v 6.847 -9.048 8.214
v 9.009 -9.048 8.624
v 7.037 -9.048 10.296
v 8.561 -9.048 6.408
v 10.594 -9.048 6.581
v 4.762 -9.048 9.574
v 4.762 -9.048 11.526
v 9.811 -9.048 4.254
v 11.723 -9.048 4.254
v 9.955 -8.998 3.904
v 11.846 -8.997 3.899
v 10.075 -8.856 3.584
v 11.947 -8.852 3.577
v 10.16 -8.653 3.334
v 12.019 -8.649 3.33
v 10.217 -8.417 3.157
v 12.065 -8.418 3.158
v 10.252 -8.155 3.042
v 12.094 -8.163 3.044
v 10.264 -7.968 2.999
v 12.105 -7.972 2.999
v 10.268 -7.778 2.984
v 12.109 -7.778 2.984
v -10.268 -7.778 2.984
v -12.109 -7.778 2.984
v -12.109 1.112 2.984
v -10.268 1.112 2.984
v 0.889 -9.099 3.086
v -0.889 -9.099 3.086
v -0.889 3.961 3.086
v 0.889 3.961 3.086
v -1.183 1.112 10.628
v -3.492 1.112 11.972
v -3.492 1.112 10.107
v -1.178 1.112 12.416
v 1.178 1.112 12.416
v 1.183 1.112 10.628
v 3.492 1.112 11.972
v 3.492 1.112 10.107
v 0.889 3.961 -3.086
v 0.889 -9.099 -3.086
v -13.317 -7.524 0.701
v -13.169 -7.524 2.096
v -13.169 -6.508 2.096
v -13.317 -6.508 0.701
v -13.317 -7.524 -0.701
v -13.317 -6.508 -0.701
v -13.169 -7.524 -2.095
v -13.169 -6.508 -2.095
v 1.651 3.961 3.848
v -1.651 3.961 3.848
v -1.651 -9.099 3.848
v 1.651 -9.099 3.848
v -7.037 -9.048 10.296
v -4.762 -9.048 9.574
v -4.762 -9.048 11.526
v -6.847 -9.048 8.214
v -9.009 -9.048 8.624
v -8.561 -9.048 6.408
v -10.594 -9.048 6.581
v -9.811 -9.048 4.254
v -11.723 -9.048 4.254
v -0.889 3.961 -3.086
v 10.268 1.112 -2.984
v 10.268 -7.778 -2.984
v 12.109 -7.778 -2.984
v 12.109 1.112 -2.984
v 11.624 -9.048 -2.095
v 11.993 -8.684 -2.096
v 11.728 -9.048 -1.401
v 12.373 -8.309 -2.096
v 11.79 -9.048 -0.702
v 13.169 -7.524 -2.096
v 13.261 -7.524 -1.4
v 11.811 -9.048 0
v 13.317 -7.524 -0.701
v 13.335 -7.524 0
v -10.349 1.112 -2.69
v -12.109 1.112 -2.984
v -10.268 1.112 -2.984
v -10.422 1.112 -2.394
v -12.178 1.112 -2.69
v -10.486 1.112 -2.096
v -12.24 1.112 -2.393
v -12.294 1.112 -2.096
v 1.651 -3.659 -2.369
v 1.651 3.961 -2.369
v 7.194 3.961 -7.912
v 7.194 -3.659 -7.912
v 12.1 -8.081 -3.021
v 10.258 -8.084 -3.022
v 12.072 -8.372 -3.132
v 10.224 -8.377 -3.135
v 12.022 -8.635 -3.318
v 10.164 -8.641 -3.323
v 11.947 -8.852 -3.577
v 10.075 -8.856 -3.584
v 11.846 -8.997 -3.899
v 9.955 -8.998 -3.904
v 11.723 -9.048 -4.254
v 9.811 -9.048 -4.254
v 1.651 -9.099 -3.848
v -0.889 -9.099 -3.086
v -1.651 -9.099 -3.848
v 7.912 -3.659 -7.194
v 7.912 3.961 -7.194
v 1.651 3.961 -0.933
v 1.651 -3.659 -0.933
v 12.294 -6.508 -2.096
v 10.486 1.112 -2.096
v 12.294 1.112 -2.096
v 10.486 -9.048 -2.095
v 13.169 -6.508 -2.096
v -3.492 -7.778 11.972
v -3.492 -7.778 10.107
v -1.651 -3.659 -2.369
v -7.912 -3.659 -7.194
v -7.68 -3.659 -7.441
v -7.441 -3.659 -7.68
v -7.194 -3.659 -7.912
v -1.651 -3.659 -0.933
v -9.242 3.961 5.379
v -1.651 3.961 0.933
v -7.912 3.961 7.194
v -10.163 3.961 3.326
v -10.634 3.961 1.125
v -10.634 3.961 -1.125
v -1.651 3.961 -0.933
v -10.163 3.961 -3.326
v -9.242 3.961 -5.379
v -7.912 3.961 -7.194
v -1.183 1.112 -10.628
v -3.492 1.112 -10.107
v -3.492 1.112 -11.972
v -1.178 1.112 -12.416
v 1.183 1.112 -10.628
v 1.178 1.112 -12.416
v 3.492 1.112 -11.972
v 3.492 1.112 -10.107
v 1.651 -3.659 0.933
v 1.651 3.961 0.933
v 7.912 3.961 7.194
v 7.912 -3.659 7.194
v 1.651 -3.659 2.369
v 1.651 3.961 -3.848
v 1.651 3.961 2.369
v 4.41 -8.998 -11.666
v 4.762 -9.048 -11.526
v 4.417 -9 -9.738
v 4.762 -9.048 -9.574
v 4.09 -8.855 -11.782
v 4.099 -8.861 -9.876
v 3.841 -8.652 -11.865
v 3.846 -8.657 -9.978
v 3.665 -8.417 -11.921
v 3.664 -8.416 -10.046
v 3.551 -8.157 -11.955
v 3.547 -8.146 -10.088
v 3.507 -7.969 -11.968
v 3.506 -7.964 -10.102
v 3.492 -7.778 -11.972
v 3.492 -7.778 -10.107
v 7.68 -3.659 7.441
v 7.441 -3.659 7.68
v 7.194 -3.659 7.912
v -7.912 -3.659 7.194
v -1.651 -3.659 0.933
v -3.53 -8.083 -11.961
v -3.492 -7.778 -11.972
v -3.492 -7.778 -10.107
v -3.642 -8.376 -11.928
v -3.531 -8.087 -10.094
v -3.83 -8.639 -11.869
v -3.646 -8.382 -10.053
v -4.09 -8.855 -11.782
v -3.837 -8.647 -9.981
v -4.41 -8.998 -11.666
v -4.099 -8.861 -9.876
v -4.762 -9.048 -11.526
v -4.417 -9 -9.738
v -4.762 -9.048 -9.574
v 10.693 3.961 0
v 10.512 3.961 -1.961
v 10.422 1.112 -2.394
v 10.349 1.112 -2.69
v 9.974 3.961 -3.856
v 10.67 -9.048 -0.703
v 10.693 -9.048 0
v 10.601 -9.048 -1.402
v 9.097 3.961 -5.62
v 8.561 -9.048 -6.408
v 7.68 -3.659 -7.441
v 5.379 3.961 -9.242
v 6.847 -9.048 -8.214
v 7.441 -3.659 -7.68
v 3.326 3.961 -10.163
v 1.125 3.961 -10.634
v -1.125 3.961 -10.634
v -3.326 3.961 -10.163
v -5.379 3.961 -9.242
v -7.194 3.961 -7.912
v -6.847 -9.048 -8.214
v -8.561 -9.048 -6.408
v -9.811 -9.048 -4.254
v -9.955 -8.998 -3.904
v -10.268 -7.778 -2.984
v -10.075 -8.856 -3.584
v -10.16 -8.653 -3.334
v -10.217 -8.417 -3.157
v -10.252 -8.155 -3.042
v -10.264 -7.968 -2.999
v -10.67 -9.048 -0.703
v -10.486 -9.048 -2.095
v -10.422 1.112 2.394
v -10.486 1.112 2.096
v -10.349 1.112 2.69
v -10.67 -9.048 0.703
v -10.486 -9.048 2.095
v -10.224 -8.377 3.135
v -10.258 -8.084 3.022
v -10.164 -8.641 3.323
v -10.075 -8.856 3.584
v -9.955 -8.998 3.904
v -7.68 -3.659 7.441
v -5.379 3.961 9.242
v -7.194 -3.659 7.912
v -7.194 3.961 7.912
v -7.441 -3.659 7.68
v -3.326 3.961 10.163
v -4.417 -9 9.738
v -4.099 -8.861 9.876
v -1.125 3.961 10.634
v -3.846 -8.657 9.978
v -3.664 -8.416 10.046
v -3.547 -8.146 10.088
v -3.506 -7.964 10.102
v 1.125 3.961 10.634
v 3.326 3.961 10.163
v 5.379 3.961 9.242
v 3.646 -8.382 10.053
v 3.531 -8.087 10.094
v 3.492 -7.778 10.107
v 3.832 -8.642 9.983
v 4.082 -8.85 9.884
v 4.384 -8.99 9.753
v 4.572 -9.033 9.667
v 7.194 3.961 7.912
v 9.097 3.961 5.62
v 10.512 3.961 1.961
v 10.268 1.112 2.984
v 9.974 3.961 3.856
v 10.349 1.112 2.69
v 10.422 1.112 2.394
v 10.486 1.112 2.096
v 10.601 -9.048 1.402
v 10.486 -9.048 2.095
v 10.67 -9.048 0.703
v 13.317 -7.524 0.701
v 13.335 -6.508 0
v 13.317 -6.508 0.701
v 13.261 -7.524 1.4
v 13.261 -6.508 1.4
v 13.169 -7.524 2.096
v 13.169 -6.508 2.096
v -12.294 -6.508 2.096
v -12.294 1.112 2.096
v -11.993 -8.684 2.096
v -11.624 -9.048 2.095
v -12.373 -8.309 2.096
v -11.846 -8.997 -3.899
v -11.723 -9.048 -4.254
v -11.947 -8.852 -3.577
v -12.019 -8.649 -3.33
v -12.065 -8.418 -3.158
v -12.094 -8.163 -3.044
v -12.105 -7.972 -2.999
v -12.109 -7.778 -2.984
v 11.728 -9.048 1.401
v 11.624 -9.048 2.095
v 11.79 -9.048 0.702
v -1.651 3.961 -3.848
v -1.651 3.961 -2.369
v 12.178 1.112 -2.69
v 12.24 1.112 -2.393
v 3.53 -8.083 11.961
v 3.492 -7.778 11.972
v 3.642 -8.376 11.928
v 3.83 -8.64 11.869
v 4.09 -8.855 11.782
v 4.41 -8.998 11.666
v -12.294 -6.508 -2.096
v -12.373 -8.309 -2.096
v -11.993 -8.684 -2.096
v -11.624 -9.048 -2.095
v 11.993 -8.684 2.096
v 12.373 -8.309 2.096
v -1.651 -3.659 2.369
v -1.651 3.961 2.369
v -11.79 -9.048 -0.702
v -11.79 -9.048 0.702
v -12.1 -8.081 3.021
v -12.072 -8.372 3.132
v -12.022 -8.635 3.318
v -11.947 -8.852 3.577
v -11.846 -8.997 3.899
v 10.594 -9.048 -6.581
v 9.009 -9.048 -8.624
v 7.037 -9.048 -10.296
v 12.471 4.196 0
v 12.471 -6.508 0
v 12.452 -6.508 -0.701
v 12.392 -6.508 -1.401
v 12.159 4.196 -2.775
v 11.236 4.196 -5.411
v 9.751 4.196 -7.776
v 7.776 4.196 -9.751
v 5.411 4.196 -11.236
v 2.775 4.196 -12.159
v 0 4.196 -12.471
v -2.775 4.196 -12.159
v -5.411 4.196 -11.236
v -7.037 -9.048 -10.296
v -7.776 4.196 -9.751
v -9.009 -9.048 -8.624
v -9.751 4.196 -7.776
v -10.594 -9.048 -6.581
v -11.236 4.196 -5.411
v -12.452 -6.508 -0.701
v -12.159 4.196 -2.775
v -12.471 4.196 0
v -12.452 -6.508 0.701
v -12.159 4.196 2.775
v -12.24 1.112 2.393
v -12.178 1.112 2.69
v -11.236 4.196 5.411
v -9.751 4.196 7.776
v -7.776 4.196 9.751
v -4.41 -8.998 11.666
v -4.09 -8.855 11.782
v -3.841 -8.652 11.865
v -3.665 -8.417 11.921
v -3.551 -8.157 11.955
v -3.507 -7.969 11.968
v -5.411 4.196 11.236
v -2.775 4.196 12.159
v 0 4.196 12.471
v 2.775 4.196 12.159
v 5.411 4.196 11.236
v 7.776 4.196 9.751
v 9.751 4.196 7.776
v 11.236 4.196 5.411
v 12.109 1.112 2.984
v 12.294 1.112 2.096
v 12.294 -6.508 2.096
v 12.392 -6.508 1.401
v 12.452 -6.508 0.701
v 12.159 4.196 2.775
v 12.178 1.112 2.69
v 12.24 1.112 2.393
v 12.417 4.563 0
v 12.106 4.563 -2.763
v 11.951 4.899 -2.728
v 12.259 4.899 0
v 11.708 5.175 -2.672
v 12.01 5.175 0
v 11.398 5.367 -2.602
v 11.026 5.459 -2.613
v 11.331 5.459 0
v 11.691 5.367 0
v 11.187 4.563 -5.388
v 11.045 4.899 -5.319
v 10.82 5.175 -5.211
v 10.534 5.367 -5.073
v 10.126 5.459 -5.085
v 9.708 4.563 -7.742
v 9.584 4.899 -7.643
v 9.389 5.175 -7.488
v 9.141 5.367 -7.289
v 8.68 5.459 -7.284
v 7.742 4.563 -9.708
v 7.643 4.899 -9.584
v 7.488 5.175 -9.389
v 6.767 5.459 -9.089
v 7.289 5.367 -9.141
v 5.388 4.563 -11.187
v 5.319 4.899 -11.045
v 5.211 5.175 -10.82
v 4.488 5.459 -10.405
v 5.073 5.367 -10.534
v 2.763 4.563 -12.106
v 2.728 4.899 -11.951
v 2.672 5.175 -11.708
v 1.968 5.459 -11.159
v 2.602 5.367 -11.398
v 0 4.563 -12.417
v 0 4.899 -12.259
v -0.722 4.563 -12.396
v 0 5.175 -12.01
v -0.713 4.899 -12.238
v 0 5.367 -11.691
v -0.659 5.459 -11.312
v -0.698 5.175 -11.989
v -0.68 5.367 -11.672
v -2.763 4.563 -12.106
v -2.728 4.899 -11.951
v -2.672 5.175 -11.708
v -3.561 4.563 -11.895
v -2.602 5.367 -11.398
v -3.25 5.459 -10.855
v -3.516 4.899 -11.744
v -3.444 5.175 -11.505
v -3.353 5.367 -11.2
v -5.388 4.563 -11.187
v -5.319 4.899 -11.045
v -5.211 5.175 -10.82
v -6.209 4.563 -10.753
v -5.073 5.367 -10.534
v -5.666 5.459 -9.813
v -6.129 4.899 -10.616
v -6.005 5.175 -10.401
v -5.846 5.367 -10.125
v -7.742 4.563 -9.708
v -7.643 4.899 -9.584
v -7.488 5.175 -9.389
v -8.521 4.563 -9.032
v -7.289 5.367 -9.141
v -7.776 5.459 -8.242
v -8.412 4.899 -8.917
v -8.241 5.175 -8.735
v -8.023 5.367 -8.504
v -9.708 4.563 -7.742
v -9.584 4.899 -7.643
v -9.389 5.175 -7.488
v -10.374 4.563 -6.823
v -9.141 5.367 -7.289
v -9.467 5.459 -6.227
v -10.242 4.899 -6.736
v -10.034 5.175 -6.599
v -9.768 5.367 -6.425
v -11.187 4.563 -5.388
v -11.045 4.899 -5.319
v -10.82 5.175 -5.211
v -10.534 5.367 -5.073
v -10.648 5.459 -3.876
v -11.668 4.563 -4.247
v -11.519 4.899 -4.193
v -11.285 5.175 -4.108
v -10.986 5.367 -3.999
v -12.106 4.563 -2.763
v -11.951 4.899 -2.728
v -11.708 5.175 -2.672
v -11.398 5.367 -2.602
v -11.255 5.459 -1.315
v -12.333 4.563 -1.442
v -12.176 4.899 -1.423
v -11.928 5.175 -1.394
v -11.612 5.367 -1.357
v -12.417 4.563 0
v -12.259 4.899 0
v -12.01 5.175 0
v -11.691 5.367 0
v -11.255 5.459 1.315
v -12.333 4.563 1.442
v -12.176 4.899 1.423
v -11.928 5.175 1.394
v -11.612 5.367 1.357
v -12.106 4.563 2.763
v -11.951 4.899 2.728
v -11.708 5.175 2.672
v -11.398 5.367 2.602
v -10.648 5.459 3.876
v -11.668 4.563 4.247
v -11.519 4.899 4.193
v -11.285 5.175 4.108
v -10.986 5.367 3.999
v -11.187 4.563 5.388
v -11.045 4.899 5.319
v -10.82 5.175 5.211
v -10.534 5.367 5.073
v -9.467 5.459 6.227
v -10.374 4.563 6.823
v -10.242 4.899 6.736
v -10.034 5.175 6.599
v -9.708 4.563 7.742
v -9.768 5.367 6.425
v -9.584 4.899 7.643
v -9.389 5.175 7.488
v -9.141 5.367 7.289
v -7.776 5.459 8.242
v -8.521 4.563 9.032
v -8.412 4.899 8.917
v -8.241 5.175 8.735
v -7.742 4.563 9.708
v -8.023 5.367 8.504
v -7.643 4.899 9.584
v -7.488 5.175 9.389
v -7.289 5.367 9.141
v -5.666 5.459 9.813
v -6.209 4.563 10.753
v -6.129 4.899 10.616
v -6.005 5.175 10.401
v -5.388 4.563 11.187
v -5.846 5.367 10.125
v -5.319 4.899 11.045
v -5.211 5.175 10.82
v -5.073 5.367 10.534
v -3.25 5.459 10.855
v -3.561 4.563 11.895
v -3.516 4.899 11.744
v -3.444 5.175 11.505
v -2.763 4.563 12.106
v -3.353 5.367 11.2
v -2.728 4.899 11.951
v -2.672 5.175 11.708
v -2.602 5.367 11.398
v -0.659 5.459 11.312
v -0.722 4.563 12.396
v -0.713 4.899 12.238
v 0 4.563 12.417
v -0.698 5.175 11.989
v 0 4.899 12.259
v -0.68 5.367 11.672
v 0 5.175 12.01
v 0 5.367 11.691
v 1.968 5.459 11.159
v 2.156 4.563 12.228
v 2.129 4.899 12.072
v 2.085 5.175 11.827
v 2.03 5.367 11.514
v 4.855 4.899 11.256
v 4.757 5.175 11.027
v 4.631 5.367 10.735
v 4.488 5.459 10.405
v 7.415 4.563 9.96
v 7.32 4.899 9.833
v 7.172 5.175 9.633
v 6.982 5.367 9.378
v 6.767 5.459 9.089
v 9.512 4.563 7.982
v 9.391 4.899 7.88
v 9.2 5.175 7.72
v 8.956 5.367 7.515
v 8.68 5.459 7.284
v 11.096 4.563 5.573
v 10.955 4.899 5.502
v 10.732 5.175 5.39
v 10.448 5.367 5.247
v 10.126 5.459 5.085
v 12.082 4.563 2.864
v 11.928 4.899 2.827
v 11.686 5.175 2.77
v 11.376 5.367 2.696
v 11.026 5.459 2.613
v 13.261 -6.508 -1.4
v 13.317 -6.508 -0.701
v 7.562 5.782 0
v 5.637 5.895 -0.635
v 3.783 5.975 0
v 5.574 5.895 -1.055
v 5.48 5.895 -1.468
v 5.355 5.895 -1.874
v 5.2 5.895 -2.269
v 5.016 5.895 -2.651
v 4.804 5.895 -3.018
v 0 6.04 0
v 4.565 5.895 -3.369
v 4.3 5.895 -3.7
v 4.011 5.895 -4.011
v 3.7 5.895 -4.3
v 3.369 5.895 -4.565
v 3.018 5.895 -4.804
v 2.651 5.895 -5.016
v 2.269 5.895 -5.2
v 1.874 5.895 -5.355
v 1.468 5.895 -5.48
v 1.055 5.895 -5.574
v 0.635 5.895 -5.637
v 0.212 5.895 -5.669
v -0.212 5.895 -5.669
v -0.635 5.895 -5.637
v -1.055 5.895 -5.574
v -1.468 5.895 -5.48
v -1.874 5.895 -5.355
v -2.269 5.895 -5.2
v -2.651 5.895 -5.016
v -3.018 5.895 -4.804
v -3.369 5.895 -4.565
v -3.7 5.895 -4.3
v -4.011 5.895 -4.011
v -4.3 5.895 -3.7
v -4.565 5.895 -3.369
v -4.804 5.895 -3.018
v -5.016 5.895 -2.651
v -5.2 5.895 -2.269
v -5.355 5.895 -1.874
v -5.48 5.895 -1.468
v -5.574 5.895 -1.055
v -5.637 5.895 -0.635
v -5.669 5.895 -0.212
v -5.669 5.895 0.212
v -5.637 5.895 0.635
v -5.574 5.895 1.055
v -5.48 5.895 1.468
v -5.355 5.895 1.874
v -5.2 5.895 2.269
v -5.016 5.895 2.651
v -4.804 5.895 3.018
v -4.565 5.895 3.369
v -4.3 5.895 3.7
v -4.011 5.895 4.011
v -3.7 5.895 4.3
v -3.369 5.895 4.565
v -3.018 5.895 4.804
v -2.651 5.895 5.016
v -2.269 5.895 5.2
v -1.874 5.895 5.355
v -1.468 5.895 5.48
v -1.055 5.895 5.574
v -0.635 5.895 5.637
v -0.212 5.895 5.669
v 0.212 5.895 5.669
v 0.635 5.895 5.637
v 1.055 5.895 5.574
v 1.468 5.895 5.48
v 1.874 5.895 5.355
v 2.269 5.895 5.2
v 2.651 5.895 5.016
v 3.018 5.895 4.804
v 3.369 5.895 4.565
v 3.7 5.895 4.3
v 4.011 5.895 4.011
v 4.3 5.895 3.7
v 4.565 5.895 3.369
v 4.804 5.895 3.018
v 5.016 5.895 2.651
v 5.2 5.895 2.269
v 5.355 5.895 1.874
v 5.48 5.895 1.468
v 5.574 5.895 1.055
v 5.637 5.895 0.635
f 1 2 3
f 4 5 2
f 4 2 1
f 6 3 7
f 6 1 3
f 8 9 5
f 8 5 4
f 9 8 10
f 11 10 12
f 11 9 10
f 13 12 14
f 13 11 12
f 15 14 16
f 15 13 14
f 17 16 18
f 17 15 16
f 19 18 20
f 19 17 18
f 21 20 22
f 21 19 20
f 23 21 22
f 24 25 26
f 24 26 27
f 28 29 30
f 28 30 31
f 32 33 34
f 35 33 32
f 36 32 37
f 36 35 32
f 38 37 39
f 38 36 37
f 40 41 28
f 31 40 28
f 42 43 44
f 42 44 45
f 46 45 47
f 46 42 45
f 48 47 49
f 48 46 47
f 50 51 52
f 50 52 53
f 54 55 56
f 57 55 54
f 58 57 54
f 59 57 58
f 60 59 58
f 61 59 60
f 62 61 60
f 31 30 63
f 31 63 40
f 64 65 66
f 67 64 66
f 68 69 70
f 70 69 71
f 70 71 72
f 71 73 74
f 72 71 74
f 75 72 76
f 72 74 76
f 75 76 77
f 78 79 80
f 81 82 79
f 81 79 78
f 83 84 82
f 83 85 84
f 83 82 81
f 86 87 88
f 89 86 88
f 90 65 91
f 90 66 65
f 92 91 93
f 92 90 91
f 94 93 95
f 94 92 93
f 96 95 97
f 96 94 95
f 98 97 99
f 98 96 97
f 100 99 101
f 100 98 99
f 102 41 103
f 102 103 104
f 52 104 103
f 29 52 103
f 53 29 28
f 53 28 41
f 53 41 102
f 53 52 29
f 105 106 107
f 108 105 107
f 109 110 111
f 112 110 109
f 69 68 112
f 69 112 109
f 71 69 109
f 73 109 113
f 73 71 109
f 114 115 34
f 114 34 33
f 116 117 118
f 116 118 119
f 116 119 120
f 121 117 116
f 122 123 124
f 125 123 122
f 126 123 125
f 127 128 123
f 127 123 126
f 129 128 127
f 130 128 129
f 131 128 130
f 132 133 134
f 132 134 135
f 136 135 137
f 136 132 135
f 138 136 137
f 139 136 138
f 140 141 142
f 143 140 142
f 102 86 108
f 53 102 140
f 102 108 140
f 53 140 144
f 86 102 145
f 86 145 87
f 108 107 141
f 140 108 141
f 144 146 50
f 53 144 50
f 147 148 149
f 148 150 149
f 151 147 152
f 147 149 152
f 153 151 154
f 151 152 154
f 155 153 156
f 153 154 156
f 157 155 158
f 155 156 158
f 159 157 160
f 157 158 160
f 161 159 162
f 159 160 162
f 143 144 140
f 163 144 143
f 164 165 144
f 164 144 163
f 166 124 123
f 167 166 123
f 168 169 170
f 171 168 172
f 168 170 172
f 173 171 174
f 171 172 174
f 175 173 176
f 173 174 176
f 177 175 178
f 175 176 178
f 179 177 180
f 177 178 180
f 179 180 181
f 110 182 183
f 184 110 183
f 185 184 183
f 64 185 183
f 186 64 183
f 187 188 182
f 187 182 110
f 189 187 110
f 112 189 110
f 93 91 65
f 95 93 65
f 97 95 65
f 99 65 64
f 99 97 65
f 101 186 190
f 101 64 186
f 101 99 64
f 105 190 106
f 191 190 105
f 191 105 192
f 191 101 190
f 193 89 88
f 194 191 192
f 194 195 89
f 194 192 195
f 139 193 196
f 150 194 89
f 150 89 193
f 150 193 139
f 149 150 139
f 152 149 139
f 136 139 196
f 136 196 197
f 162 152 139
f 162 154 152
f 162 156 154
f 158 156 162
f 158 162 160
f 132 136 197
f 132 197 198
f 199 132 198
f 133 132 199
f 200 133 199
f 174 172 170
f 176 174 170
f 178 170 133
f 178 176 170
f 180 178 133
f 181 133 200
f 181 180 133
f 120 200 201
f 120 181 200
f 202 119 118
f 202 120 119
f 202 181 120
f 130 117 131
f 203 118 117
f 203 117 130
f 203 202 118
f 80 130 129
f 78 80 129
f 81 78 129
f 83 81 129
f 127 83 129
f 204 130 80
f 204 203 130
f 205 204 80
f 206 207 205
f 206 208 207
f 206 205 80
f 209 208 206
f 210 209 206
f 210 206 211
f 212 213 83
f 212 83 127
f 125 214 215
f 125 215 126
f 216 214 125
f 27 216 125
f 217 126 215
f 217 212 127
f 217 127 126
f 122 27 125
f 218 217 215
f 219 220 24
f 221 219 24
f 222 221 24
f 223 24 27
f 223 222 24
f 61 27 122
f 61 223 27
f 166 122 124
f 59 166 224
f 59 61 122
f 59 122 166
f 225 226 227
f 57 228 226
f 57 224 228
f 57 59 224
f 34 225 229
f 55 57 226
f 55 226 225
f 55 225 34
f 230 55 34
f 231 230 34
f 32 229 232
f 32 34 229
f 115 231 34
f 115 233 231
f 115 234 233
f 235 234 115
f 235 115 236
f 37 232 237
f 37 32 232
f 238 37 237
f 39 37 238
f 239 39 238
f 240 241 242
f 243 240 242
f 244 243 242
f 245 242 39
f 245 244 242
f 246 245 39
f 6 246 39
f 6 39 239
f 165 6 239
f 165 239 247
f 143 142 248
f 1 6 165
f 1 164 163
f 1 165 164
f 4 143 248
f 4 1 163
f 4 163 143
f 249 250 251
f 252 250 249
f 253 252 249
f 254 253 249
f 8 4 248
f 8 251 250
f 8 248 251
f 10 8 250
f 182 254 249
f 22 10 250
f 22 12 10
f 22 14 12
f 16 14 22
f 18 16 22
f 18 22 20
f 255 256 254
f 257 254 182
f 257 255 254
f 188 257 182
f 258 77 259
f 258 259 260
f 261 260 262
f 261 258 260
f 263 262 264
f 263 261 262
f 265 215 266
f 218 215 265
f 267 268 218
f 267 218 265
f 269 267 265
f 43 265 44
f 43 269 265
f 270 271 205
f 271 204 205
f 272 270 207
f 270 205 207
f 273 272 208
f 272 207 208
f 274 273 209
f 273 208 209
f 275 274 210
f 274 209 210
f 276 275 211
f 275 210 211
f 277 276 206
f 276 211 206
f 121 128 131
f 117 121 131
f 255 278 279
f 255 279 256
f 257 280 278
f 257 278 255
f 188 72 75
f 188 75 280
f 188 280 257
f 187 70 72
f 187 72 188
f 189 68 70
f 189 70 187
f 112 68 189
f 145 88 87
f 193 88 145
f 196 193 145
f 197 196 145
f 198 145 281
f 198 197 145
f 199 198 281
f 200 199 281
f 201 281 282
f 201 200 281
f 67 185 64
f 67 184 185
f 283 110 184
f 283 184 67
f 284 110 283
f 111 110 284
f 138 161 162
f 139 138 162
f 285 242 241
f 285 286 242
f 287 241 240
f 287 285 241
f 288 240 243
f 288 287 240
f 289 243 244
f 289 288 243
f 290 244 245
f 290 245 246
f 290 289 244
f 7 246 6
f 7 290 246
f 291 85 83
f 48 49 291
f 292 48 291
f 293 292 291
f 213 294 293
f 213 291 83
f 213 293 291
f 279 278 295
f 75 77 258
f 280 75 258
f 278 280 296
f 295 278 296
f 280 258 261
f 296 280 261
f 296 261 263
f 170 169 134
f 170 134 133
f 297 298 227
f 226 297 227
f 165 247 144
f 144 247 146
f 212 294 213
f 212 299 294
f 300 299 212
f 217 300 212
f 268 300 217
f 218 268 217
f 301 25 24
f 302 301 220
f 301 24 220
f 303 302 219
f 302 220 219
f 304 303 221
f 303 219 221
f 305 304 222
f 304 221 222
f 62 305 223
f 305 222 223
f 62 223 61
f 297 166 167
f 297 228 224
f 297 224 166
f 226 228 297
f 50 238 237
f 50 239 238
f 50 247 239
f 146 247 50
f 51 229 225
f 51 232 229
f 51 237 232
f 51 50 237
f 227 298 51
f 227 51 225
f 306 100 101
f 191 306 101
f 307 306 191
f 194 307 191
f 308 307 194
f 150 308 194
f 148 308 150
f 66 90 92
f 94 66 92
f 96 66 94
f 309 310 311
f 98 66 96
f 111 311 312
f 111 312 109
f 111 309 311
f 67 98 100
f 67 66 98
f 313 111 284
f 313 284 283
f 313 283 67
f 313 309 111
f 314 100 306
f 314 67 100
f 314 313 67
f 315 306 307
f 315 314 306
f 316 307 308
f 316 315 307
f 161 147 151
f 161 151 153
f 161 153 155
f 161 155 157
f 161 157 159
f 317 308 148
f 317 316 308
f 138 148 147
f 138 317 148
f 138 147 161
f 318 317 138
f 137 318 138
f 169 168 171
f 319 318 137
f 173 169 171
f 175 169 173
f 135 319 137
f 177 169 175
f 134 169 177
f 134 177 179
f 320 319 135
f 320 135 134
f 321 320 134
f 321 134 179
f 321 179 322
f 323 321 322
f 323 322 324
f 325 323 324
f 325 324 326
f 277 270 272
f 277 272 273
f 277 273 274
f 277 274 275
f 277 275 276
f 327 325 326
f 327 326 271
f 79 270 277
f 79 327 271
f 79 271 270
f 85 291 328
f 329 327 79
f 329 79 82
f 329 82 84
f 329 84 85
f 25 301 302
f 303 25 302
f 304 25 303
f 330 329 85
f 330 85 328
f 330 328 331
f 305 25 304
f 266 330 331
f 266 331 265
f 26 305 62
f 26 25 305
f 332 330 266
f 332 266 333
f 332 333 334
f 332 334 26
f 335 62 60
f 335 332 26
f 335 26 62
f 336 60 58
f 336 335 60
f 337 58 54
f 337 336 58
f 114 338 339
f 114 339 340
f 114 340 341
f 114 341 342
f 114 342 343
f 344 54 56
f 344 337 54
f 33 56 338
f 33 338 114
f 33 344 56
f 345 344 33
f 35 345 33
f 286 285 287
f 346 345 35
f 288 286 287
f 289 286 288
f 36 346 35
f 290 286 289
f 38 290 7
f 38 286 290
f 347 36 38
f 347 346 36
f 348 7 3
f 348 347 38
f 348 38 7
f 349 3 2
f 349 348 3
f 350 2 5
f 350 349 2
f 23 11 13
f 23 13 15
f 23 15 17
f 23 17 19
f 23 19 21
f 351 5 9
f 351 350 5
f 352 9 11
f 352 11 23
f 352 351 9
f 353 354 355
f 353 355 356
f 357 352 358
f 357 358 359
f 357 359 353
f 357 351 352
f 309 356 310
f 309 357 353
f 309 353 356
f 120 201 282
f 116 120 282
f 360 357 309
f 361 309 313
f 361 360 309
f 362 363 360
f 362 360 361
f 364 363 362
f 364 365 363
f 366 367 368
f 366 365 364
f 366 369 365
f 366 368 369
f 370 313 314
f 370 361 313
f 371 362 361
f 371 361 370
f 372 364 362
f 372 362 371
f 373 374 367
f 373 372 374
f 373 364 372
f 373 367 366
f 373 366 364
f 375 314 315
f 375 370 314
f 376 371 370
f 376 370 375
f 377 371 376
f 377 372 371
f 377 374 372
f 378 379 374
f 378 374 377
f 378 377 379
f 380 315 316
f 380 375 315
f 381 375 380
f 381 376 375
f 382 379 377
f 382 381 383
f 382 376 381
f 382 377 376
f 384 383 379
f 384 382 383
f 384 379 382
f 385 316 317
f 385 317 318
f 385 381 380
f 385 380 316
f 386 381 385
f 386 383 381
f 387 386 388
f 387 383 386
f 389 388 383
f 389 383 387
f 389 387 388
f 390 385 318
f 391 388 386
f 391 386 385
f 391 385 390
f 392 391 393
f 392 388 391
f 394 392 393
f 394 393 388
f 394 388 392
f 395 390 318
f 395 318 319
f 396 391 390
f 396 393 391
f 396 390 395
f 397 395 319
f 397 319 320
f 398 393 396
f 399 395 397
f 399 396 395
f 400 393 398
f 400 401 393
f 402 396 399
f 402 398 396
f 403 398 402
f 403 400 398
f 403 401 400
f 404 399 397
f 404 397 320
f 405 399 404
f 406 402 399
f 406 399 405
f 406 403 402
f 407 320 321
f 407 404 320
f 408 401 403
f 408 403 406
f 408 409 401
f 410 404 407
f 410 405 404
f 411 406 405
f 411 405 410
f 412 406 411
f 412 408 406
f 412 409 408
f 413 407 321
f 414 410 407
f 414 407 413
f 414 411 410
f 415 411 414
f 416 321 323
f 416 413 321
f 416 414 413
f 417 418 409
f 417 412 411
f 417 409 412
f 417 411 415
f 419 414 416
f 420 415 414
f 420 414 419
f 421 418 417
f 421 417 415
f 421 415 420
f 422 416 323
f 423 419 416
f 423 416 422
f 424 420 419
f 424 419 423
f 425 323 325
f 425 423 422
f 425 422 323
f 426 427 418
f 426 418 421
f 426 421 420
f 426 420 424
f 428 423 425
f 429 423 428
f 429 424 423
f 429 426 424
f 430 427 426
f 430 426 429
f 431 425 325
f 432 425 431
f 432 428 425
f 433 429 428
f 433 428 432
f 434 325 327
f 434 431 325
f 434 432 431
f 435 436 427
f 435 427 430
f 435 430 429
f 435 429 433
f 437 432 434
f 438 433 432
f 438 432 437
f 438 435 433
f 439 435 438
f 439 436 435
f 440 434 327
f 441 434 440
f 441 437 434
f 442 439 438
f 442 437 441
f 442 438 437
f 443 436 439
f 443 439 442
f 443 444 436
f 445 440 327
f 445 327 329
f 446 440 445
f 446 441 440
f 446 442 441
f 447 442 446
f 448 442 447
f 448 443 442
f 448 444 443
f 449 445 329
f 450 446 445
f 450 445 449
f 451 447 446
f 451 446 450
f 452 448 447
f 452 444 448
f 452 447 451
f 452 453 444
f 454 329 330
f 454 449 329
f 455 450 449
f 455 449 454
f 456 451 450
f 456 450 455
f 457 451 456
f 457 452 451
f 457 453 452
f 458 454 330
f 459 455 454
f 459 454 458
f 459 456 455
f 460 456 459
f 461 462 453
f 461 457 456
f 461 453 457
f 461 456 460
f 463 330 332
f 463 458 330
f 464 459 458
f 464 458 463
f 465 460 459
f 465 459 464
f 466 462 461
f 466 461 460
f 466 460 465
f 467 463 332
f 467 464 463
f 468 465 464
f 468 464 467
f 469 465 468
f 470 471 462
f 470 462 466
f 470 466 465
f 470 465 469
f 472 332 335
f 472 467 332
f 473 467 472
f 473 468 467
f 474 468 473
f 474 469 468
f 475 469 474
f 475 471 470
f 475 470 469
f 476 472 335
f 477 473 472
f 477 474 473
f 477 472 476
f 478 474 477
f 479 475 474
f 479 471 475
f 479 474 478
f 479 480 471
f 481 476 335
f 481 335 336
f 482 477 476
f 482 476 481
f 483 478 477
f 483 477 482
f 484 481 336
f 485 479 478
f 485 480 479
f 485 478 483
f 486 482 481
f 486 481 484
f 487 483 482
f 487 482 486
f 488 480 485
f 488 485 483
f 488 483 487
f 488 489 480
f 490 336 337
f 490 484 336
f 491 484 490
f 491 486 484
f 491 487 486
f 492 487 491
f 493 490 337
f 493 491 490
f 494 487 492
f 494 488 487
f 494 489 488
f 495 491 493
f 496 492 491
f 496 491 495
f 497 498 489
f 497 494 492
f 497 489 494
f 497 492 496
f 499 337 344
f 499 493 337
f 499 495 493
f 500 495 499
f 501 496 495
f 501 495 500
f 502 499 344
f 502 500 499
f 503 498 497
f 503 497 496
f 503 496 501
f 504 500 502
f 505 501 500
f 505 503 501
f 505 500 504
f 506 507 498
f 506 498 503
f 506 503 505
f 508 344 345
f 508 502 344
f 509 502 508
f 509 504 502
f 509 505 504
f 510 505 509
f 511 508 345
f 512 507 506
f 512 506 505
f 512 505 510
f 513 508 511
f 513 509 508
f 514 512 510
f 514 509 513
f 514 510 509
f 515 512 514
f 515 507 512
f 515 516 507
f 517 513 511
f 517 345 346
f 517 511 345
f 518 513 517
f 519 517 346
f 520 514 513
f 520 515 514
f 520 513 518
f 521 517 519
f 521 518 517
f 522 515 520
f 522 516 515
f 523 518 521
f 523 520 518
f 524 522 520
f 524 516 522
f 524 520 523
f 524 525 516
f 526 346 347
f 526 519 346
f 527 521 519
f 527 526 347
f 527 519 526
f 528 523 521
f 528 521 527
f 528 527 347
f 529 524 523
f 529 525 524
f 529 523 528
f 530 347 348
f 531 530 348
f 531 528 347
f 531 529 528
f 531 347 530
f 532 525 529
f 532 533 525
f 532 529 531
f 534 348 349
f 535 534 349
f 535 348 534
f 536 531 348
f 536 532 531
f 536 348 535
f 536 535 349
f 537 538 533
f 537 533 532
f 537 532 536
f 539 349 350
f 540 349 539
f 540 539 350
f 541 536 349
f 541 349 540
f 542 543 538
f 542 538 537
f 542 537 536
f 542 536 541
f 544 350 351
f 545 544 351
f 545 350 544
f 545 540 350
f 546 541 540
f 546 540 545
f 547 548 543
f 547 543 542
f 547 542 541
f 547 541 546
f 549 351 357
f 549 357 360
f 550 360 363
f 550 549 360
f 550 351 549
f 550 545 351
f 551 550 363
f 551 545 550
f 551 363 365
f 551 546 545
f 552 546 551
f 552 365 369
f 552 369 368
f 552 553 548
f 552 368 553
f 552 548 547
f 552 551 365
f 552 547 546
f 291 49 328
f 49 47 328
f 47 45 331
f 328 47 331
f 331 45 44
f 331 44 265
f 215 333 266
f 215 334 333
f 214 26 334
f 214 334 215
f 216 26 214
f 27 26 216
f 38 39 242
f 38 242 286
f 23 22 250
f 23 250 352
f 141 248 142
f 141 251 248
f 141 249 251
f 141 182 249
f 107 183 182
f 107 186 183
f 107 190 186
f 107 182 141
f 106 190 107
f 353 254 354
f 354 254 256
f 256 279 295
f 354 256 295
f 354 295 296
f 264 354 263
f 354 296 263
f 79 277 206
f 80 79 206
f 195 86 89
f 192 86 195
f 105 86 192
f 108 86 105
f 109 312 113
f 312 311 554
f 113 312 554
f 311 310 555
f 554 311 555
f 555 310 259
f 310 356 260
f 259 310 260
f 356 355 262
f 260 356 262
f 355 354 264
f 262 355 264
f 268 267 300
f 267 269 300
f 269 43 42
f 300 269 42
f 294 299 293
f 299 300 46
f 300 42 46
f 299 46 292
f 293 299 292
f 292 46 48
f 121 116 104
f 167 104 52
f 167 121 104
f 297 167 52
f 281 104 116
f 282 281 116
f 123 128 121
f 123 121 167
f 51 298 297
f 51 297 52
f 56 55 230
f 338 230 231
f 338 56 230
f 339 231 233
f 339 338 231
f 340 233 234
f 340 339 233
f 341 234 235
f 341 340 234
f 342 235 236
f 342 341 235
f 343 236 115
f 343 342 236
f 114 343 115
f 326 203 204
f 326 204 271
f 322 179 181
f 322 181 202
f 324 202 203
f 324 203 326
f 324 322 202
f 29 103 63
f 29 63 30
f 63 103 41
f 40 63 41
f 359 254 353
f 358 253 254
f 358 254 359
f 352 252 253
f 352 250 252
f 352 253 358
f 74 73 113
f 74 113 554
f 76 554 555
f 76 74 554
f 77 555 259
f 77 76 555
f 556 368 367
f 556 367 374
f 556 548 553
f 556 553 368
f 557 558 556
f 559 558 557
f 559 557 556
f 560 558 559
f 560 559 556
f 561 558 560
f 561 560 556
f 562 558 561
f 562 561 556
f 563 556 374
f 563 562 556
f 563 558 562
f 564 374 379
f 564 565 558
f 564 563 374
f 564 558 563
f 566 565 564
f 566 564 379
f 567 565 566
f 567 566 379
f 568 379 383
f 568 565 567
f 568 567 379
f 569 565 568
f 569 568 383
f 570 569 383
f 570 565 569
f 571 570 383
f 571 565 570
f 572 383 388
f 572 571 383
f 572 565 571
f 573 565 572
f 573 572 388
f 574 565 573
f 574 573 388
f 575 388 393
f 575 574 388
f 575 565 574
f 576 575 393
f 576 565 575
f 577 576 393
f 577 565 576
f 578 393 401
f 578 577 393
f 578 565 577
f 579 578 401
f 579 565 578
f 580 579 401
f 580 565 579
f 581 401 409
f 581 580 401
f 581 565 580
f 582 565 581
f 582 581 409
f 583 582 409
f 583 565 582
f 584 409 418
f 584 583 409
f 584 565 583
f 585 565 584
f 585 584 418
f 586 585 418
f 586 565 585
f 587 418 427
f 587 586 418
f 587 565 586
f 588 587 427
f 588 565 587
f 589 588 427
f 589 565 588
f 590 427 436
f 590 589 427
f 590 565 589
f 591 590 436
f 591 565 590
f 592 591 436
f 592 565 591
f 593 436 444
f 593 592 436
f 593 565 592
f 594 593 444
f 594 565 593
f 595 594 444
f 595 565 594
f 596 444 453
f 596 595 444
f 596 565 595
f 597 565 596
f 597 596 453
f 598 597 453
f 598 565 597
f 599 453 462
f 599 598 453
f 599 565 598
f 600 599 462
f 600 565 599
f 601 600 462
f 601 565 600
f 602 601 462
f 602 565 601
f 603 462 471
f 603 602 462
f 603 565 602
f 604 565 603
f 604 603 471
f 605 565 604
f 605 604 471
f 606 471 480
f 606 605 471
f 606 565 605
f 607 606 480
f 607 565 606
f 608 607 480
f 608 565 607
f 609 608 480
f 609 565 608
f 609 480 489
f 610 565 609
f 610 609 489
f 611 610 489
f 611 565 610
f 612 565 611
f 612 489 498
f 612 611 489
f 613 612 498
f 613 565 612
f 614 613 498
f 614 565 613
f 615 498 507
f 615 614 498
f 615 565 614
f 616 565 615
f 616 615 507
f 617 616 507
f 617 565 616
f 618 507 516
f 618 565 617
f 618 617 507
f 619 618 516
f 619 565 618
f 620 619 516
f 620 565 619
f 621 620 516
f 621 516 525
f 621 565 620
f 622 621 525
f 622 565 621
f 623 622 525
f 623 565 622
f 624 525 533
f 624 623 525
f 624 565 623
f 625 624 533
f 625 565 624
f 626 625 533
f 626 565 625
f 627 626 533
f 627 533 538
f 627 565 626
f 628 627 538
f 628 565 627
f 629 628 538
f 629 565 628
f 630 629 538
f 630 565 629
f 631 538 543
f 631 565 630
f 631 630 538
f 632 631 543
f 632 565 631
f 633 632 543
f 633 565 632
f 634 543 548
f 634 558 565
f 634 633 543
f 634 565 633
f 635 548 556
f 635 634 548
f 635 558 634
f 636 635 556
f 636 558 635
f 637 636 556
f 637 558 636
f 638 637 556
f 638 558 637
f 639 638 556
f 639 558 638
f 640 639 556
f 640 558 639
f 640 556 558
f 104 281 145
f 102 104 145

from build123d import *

# Parameters (mm, degrees)
SKETCH2_W     = 6.985
SKETCH2_H     = 32.356336156
SKETCH2_W_2   = 40.972237954
SKETCH2_H_2   = 0.889
CUTOUT_DEPTH  = 10.16
TAB_DEPTH     = 2.54
TAB_CHMF_SIZE = 1.524
CROSS_DEPTH   = 7.62
SKETCH4_W     = 3.302
SKETCH4_H     = 7.6962
BOX_DEPTH     = 13.059399
SKETCH6_W     = 1.778
SKETCH6_H     = 6.1722
BOXCUT_DEPTH  = 13.059399
FILLET1_R     = 1.27


with BuildPart() as part:
    # Sketch1 → dome/base (revolve)
    with BuildSketch(Plane.XY):
        with BuildLine():
            Line((0, 6.039891065), (0, 3.960890157))
            Line((0, 3.960890157), (10.6934, 3.960890157))
            Line((10.6934, 3.960890157), (10.6934, -9.047708935))
            Line((10.6934, -9.047708935), (12.4714, -9.047708935))
            Line((12.4714, -9.047708935), (12.4714, 4.195604597))
            ThreePointArc((12.4714, 4.195604597), (12.144228327, 5.046471653), (11.33128229, 5.45894564))
            ThreePointArc((11.33128229, 5.45894564), (5.673082405, 5.894559394), (0, 6.039891065))
        make_face()
    revolve(axis=Axis((0, 0, 0), (0, 1, 0)))

    # Sketch2 → cutout (cut)
    with BuildSketch(Plane.XZ.offset(9.047708935)):
        Rectangle(SKETCH2_W, SKETCH2_H)
        with Locations((0, 2.54)):
            Rectangle(SKETCH2_W_2, SKETCH2_H_2)
        with Locations((0, -2.54)):
            Rectangle(SKETCH2_W_2, SKETCH2_H_2)
    extrude(amount=-CUTOUT_DEPTH, mode=Mode.SUBTRACT)

    # Sketch3 → tab (add)
    with BuildSketch(Plane.XZ.offset(9.047708935)):
        with BuildLine():
            Line((-13.169324385, -2.0955), (-12.294091984, -2.0955))
            ThreePointArc((-12.294091984, -2.0955), (-12.4714, 0), (-12.294091984, 2.0955))
            Line((-12.294091984, 2.0955), (-13.169324385, 2.0955))
            ThreePointArc((-13.169324385, 2.0955), (-13.335, 0), (-13.169324385, -2.0955))
        make_face()
        with BuildLine():
            Line((12.294091984, -2.0955), (13.169324385, -2.0955))
            ThreePointArc((13.169324385, -2.0955), (13.293516571, -1.051019583), (13.335, 0))
            ThreePointArc((13.335, 0), (13.293516571, 1.051019583), (13.169324385, 2.0955))
            Line((13.169324385, 2.0955), (12.294091984, 2.0955))
            ThreePointArc((12.294091984, 2.0955), (12.4714, 0), (12.294091984, -2.0955))
        make_face()
    extrude(amount=-TAB_DEPTH)

    # tab chmf
    tab_chmf_edges = [part.edges().sort_by_distance(p)[0] for p in [
        (-13.335, -9.047708935, 0),
        (13.335, -9.047708935, 0),
    ]]
    chamfer(tab_chmf_edges, length=TAB_CHMF_SIZE)

    # Sketch5 → cross (add)
    with BuildSketch(Plane.XZ.offset(-3.960890157)):
        with BuildLine():
            Line((0, -0.71842049), (-0.71842049, 0))
            Line((-0.71842049, 0), (-7.91204877, -7.19362828))
            ThreePointArc((-7.91204877, -7.19362828), (-7.561375654, -7.561375654), (-7.19362828, -7.91204877))
            Line((-7.19362828, -7.91204877), (0, -0.71842049))
        make_face()
        with BuildLine():
            Line((7.91204877, -7.19362828), (0.71842049, 0))
            Line((0.71842049, 0), (0, -0.71842049))
            Line((0, -0.71842049), (7.19362828, -7.91204877))
            ThreePointArc((7.19362828, -7.91204877), (7.561375654, -7.561375654), (7.91204877, -7.19362828))
        make_face()
        with BuildLine():
            Line((7.19362828, 7.91204877), (0, 0.71842049))
            Line((0, 0.71842049), (0.71842049, 0))
            Line((0.71842049, 0), (7.91204877, 7.19362828))
            ThreePointArc((7.91204877, 7.19362828), (7.561375654, 7.561375654), (7.19362828, 7.91204877))
        make_face()
        Polygon((0.71842049, 0), (0, 0.71842049), (-0.71842049, 0), (0, -0.71842049), align=None)
        with BuildLine():
            Line((-0.71842049, 0), (0, 0.71842049))
            Line((0, 0.71842049), (-7.19362828, 7.91204877))
            ThreePointArc((-7.19362828, 7.91204877), (-7.561375654, 7.561375654), (-7.91204877, 7.19362828))
            Line((-7.91204877, 7.19362828), (-0.71842049, 0))
        make_face()
    extrude(amount=CROSS_DEPTH)

    # Sketch4 → box (add)
    with BuildSketch(Plane.XZ.offset(-3.960890157)):
        Rectangle(SKETCH4_W, SKETCH4_H)
    extrude(amount=BOX_DEPTH)

    # Sketch6 → boxcut (cut)
    with BuildSketch(Plane.XZ.offset(9.098508935)):
        Rectangle(SKETCH6_W, SKETCH6_H)
    extrude(amount=-BOXCUT_DEPTH, mode=Mode.SUBTRACT)

    # Fillet1
    fillet1_edges = [part.edges().sort_by_distance(p)[0] for p in [
        (-3.4925, -9.047708935, -11.039692922),
        (3.4925, -9.047708935, -11.039692922),
        (11.188751506, -9.047708935, -2.9845),
        (-11.188751506, -9.047708935, -2.9845),
        (-3.4925, -9.047708935, 11.039692922),
        (3.4925, -9.047708935, 11.039692922),
        (-11.188751506, -9.047708935, 2.9845),
        (11.188751506, -9.047708935, 2.9845),
    ]]
    fillet(fillet1_edges, radius=FILLET1_R)


solid = part.part
